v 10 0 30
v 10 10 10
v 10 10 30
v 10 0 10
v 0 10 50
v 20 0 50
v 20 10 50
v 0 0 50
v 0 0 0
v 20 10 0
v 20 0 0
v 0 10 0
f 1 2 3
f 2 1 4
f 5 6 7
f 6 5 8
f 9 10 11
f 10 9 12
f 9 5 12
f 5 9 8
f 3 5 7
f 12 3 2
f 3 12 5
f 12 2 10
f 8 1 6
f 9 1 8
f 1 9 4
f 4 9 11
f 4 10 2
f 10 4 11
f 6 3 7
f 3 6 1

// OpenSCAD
cube([10, 10, 50]);
translate([10, 0, 0]) {
	multmatrix(m = [[1, 0, -1], [0, 1, 0], [0, 0, 1]]) {
		cube(10);
	}
}
translate([0, 0, 30]) {
	multmatrix(m = [[1, 0, 0.5], [0, 1, 0], [0, 0, 1]]) {
		cube([10, 10, 20]);
	}
}
